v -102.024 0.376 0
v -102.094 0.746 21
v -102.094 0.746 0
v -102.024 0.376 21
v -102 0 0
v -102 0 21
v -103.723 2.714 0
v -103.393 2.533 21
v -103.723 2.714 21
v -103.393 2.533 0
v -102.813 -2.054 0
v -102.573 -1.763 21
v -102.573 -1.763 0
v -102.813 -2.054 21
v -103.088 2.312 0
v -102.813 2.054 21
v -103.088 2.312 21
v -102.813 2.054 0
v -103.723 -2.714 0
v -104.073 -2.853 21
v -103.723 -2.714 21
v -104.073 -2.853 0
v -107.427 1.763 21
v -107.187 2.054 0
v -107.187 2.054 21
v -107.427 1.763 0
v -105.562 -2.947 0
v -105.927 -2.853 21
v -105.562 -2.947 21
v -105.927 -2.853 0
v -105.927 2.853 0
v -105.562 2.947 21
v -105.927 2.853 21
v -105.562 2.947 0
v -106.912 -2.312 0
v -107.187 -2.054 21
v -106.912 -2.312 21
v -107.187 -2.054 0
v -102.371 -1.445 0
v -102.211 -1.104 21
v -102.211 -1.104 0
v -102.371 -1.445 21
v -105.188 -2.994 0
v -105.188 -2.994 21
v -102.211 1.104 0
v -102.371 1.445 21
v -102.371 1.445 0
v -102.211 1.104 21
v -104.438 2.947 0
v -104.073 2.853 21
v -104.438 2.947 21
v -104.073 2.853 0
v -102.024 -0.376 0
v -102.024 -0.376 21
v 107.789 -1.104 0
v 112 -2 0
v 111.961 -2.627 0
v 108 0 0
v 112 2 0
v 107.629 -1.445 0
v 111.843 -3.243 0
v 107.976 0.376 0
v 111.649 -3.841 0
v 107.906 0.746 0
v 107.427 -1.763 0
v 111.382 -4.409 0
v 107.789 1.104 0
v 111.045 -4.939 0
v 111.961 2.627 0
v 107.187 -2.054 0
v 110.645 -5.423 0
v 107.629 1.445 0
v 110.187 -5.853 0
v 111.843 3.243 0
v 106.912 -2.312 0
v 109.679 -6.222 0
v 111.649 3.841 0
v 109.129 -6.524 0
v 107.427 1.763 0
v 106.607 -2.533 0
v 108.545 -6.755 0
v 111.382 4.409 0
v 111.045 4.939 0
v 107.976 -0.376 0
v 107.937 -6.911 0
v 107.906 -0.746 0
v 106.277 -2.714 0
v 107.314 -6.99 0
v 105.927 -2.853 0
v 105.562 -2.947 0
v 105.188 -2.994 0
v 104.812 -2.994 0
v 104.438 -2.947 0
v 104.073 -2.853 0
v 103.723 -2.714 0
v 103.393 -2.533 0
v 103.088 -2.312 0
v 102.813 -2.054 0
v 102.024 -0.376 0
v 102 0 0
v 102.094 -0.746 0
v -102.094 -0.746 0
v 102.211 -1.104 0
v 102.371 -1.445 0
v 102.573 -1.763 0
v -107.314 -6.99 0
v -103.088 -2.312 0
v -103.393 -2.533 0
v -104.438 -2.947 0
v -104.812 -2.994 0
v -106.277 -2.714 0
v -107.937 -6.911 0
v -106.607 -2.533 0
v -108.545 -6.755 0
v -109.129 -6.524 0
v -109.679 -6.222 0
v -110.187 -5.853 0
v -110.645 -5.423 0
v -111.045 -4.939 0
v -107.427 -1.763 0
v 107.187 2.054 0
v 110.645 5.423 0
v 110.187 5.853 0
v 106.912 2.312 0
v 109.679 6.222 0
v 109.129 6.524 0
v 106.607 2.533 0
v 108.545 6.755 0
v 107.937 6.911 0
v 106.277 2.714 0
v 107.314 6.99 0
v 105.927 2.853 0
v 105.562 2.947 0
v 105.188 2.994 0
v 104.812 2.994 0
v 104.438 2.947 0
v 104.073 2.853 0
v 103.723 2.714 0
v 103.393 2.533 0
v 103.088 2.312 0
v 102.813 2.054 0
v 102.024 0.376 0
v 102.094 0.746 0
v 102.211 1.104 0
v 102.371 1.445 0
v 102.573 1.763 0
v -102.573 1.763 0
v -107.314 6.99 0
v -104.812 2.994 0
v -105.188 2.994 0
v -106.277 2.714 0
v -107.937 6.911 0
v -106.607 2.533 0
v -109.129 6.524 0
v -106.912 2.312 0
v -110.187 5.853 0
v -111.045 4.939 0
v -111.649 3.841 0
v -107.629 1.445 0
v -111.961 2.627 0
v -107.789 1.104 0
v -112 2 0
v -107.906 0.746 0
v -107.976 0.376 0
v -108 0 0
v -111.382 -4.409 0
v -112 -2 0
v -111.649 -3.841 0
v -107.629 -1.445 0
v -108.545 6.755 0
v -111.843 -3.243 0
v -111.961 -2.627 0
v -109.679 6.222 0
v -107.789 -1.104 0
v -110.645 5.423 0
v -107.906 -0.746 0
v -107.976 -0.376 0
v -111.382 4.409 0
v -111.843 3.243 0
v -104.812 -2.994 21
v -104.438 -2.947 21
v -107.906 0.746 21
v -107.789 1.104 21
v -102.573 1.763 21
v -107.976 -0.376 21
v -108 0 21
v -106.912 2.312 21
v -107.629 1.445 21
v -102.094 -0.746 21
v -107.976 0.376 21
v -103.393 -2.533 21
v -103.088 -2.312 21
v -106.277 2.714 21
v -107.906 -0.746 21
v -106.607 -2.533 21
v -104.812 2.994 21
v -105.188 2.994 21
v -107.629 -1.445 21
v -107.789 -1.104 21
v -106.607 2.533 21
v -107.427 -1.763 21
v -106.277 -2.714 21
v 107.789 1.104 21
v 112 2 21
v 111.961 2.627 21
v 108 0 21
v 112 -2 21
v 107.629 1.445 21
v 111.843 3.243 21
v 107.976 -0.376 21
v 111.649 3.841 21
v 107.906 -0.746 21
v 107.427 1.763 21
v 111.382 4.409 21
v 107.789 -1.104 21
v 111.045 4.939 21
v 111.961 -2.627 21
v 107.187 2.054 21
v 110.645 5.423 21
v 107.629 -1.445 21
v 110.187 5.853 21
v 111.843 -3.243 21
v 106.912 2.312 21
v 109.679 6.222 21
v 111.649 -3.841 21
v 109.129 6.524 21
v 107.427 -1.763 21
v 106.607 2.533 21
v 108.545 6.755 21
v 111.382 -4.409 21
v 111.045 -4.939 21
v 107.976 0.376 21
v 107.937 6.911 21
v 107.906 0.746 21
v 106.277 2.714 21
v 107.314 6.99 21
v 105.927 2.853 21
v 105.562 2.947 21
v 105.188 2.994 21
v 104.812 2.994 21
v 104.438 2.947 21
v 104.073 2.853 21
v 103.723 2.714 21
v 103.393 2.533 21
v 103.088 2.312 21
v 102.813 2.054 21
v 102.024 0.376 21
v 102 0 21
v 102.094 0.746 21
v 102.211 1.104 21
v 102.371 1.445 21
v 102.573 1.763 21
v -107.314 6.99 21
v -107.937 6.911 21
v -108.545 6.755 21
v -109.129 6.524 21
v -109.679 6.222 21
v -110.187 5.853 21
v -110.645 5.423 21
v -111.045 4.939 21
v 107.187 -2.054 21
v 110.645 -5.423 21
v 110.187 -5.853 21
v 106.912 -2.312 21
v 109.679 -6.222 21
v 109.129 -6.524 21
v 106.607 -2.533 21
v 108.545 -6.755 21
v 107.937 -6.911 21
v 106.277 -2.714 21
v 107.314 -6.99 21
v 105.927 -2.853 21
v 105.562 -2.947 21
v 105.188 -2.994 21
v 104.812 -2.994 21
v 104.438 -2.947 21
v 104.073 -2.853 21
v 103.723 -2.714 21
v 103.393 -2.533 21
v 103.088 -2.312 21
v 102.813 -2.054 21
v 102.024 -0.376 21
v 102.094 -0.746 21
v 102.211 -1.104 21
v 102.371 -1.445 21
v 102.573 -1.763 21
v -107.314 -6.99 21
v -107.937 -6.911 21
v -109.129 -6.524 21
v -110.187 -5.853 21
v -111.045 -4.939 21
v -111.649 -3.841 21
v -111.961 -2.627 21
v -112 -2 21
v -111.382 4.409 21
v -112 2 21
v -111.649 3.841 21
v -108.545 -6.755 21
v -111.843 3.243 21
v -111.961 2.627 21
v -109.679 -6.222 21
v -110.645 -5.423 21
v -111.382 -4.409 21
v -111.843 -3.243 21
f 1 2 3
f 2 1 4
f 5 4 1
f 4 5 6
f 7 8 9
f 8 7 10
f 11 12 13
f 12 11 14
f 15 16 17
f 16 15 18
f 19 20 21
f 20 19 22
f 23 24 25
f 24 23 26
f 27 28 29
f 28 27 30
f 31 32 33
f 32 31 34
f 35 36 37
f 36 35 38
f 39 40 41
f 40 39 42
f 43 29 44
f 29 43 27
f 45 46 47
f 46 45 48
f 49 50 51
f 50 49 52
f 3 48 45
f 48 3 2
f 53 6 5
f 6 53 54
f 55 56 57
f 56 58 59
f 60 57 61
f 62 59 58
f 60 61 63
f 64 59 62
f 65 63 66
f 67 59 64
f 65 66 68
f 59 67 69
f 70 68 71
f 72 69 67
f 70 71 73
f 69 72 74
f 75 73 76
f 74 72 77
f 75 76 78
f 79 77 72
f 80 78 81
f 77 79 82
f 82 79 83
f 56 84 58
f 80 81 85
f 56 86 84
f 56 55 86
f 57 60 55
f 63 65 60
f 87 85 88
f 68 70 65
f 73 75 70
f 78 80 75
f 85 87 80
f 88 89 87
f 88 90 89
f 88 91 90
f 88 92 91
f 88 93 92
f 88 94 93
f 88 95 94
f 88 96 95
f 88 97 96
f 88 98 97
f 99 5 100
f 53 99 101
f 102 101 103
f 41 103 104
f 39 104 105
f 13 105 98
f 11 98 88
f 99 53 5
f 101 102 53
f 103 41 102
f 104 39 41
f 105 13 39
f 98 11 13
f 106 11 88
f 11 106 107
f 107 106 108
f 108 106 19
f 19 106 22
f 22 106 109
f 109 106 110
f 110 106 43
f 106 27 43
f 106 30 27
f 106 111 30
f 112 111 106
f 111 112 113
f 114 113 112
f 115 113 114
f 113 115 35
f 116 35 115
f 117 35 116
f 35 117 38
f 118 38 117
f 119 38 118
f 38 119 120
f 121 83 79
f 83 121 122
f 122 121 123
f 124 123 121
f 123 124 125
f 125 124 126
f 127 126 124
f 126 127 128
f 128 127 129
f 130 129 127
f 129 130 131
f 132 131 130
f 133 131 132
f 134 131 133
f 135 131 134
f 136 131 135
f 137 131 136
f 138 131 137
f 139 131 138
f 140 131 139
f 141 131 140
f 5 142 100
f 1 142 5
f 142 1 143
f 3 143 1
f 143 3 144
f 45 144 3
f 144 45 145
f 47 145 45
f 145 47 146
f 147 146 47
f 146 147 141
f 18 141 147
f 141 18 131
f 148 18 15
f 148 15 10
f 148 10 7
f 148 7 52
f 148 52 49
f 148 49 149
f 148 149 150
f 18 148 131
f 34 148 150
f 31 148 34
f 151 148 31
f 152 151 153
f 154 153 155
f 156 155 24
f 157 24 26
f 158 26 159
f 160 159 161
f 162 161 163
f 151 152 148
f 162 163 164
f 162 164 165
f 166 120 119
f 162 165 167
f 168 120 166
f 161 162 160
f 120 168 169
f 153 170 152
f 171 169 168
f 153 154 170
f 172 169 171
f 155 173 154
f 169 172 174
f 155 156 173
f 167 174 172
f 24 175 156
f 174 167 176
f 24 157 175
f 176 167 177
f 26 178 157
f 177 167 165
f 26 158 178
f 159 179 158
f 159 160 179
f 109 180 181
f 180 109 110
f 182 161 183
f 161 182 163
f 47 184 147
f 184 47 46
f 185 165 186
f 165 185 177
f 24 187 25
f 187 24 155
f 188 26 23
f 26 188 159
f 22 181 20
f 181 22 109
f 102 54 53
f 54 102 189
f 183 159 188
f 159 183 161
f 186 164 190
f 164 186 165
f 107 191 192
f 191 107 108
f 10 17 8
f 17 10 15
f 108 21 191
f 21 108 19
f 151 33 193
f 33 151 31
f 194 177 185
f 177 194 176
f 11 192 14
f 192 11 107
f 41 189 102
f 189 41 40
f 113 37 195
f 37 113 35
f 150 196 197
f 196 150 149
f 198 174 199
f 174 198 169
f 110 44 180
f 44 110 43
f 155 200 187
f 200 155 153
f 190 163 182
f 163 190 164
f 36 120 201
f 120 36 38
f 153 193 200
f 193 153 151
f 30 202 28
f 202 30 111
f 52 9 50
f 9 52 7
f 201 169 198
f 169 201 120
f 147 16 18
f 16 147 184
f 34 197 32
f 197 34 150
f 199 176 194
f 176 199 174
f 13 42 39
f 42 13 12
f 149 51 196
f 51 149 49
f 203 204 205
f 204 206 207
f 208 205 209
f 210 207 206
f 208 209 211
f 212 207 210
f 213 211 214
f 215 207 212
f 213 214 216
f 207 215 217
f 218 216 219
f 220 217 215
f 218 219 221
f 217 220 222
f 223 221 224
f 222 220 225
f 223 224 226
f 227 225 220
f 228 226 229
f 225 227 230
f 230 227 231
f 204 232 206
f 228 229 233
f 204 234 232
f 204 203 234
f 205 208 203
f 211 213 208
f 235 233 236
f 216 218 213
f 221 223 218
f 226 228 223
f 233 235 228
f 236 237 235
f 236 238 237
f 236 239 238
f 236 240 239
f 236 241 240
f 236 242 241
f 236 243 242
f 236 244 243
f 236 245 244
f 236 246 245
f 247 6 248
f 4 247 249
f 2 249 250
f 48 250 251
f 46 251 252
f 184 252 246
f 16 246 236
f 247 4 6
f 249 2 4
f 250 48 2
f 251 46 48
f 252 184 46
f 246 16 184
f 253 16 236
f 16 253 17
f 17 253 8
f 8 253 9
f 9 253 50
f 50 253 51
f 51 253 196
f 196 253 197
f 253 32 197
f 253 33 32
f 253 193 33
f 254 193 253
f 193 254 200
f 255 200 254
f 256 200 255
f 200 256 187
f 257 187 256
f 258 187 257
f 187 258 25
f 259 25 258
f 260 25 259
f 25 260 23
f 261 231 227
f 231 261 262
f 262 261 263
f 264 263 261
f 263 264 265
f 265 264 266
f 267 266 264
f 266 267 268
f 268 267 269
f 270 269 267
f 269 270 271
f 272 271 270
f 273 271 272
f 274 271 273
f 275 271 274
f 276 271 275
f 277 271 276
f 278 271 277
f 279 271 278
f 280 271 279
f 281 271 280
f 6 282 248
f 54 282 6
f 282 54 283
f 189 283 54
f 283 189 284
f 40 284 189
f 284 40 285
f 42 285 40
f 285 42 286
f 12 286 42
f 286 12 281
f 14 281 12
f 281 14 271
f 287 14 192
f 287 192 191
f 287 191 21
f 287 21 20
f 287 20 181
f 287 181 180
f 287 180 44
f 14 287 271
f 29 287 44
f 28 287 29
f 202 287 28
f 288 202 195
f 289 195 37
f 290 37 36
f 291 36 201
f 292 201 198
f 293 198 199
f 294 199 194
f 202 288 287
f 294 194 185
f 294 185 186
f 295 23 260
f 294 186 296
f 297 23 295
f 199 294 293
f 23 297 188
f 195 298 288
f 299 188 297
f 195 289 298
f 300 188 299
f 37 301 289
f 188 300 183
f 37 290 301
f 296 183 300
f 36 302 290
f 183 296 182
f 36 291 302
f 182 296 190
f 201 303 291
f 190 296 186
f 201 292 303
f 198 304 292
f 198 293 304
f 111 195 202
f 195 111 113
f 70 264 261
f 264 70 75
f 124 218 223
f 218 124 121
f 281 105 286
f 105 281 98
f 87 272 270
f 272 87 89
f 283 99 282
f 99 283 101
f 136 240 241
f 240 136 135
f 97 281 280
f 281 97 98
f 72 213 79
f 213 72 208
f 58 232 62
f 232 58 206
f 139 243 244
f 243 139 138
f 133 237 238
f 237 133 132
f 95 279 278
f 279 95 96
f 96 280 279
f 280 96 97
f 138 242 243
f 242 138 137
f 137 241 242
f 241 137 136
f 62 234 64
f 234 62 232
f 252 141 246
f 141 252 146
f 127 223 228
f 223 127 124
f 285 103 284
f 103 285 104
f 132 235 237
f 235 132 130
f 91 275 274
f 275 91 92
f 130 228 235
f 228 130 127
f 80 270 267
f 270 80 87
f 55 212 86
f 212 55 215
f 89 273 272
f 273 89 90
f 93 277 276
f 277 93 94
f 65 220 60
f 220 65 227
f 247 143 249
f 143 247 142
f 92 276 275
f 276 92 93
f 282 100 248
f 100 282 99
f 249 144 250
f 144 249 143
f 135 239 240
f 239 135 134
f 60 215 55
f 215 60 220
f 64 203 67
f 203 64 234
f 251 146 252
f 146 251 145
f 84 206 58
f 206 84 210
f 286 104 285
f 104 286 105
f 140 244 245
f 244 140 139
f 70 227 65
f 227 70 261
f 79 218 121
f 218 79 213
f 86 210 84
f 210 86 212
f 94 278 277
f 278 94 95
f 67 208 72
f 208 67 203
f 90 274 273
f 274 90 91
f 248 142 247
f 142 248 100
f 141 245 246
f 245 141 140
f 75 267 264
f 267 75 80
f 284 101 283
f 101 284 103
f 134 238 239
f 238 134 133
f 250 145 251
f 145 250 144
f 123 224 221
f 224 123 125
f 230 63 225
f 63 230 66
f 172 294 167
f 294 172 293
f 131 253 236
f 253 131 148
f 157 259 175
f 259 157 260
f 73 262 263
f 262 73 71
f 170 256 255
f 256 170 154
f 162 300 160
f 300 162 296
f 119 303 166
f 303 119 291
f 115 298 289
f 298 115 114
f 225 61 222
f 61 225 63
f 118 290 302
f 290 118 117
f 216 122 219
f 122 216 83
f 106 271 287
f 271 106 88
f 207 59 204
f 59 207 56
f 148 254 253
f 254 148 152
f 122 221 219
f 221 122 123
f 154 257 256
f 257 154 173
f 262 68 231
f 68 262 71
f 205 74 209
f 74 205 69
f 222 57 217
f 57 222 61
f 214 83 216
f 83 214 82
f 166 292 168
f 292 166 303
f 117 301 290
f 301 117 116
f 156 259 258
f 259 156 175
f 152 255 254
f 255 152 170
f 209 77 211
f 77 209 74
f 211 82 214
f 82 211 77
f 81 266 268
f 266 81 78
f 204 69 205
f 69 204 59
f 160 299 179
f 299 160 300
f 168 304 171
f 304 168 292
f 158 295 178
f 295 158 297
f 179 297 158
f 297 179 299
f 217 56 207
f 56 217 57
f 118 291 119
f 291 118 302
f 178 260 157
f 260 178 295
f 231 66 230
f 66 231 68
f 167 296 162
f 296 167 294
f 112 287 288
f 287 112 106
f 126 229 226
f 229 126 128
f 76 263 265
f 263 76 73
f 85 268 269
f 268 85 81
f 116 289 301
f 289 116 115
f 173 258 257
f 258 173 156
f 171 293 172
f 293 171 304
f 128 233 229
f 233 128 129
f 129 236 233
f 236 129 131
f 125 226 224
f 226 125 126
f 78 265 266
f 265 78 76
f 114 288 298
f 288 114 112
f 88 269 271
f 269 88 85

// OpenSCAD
$fn = 50;


difference() {
	union() {
		hull() {
			translate(v = [-107.0000000000, 2.0000000000, 0]) {
				cylinder(h = 21, r = 5);
			}
			translate(v = [107.0000000000, 2.0000000000, 0]) {
				cylinder(h = 21, r = 5);
			}
			translate(v = [-107.0000000000, -2.0000000000, 0]) {
				cylinder(h = 21, r = 5);
			}
			translate(v = [107.0000000000, -2.0000000000, 0]) {
				cylinder(h = 21, r = 5);
			}
		}
	}
	union() {
		translate(v = [-105.0000000000, 0.0000000000, 0]) {
			cylinder(h = 21, r = 3.0000000000);
		}
		translate(v = [105.0000000000, 0.0000000000, 0]) {
			cylinder(h = 21, r = 3.0000000000);
		}
		translate(v = [-105.0000000000, 0.0000000000, 0]) {
			cylinder(h = 21, r = 1.5000000000);
		}
		translate(v = [105.0000000000, 0.0000000000, 0]) {
			cylinder(h = 21, r = 1.5000000000);
		}
		translate(v = [-105.0000000000, 0.0000000000, 0]) {
			cylinder(h = 21, r = 1.5000000000);
		}
		translate(v = [105.0000000000, 0.0000000000, 0]) {
			cylinder(h = 21, r = 1.5000000000);
		}
		translate(v = [-105.0000000000, 0.0000000000, 0]) {
			cylinder(h = 21, r = 1.5000000000);
		}
		translate(v = [105.0000000000, 0.0000000000, 0]) {
			cylinder(h = 21, r = 1.5000000000);
		}
	}
}
